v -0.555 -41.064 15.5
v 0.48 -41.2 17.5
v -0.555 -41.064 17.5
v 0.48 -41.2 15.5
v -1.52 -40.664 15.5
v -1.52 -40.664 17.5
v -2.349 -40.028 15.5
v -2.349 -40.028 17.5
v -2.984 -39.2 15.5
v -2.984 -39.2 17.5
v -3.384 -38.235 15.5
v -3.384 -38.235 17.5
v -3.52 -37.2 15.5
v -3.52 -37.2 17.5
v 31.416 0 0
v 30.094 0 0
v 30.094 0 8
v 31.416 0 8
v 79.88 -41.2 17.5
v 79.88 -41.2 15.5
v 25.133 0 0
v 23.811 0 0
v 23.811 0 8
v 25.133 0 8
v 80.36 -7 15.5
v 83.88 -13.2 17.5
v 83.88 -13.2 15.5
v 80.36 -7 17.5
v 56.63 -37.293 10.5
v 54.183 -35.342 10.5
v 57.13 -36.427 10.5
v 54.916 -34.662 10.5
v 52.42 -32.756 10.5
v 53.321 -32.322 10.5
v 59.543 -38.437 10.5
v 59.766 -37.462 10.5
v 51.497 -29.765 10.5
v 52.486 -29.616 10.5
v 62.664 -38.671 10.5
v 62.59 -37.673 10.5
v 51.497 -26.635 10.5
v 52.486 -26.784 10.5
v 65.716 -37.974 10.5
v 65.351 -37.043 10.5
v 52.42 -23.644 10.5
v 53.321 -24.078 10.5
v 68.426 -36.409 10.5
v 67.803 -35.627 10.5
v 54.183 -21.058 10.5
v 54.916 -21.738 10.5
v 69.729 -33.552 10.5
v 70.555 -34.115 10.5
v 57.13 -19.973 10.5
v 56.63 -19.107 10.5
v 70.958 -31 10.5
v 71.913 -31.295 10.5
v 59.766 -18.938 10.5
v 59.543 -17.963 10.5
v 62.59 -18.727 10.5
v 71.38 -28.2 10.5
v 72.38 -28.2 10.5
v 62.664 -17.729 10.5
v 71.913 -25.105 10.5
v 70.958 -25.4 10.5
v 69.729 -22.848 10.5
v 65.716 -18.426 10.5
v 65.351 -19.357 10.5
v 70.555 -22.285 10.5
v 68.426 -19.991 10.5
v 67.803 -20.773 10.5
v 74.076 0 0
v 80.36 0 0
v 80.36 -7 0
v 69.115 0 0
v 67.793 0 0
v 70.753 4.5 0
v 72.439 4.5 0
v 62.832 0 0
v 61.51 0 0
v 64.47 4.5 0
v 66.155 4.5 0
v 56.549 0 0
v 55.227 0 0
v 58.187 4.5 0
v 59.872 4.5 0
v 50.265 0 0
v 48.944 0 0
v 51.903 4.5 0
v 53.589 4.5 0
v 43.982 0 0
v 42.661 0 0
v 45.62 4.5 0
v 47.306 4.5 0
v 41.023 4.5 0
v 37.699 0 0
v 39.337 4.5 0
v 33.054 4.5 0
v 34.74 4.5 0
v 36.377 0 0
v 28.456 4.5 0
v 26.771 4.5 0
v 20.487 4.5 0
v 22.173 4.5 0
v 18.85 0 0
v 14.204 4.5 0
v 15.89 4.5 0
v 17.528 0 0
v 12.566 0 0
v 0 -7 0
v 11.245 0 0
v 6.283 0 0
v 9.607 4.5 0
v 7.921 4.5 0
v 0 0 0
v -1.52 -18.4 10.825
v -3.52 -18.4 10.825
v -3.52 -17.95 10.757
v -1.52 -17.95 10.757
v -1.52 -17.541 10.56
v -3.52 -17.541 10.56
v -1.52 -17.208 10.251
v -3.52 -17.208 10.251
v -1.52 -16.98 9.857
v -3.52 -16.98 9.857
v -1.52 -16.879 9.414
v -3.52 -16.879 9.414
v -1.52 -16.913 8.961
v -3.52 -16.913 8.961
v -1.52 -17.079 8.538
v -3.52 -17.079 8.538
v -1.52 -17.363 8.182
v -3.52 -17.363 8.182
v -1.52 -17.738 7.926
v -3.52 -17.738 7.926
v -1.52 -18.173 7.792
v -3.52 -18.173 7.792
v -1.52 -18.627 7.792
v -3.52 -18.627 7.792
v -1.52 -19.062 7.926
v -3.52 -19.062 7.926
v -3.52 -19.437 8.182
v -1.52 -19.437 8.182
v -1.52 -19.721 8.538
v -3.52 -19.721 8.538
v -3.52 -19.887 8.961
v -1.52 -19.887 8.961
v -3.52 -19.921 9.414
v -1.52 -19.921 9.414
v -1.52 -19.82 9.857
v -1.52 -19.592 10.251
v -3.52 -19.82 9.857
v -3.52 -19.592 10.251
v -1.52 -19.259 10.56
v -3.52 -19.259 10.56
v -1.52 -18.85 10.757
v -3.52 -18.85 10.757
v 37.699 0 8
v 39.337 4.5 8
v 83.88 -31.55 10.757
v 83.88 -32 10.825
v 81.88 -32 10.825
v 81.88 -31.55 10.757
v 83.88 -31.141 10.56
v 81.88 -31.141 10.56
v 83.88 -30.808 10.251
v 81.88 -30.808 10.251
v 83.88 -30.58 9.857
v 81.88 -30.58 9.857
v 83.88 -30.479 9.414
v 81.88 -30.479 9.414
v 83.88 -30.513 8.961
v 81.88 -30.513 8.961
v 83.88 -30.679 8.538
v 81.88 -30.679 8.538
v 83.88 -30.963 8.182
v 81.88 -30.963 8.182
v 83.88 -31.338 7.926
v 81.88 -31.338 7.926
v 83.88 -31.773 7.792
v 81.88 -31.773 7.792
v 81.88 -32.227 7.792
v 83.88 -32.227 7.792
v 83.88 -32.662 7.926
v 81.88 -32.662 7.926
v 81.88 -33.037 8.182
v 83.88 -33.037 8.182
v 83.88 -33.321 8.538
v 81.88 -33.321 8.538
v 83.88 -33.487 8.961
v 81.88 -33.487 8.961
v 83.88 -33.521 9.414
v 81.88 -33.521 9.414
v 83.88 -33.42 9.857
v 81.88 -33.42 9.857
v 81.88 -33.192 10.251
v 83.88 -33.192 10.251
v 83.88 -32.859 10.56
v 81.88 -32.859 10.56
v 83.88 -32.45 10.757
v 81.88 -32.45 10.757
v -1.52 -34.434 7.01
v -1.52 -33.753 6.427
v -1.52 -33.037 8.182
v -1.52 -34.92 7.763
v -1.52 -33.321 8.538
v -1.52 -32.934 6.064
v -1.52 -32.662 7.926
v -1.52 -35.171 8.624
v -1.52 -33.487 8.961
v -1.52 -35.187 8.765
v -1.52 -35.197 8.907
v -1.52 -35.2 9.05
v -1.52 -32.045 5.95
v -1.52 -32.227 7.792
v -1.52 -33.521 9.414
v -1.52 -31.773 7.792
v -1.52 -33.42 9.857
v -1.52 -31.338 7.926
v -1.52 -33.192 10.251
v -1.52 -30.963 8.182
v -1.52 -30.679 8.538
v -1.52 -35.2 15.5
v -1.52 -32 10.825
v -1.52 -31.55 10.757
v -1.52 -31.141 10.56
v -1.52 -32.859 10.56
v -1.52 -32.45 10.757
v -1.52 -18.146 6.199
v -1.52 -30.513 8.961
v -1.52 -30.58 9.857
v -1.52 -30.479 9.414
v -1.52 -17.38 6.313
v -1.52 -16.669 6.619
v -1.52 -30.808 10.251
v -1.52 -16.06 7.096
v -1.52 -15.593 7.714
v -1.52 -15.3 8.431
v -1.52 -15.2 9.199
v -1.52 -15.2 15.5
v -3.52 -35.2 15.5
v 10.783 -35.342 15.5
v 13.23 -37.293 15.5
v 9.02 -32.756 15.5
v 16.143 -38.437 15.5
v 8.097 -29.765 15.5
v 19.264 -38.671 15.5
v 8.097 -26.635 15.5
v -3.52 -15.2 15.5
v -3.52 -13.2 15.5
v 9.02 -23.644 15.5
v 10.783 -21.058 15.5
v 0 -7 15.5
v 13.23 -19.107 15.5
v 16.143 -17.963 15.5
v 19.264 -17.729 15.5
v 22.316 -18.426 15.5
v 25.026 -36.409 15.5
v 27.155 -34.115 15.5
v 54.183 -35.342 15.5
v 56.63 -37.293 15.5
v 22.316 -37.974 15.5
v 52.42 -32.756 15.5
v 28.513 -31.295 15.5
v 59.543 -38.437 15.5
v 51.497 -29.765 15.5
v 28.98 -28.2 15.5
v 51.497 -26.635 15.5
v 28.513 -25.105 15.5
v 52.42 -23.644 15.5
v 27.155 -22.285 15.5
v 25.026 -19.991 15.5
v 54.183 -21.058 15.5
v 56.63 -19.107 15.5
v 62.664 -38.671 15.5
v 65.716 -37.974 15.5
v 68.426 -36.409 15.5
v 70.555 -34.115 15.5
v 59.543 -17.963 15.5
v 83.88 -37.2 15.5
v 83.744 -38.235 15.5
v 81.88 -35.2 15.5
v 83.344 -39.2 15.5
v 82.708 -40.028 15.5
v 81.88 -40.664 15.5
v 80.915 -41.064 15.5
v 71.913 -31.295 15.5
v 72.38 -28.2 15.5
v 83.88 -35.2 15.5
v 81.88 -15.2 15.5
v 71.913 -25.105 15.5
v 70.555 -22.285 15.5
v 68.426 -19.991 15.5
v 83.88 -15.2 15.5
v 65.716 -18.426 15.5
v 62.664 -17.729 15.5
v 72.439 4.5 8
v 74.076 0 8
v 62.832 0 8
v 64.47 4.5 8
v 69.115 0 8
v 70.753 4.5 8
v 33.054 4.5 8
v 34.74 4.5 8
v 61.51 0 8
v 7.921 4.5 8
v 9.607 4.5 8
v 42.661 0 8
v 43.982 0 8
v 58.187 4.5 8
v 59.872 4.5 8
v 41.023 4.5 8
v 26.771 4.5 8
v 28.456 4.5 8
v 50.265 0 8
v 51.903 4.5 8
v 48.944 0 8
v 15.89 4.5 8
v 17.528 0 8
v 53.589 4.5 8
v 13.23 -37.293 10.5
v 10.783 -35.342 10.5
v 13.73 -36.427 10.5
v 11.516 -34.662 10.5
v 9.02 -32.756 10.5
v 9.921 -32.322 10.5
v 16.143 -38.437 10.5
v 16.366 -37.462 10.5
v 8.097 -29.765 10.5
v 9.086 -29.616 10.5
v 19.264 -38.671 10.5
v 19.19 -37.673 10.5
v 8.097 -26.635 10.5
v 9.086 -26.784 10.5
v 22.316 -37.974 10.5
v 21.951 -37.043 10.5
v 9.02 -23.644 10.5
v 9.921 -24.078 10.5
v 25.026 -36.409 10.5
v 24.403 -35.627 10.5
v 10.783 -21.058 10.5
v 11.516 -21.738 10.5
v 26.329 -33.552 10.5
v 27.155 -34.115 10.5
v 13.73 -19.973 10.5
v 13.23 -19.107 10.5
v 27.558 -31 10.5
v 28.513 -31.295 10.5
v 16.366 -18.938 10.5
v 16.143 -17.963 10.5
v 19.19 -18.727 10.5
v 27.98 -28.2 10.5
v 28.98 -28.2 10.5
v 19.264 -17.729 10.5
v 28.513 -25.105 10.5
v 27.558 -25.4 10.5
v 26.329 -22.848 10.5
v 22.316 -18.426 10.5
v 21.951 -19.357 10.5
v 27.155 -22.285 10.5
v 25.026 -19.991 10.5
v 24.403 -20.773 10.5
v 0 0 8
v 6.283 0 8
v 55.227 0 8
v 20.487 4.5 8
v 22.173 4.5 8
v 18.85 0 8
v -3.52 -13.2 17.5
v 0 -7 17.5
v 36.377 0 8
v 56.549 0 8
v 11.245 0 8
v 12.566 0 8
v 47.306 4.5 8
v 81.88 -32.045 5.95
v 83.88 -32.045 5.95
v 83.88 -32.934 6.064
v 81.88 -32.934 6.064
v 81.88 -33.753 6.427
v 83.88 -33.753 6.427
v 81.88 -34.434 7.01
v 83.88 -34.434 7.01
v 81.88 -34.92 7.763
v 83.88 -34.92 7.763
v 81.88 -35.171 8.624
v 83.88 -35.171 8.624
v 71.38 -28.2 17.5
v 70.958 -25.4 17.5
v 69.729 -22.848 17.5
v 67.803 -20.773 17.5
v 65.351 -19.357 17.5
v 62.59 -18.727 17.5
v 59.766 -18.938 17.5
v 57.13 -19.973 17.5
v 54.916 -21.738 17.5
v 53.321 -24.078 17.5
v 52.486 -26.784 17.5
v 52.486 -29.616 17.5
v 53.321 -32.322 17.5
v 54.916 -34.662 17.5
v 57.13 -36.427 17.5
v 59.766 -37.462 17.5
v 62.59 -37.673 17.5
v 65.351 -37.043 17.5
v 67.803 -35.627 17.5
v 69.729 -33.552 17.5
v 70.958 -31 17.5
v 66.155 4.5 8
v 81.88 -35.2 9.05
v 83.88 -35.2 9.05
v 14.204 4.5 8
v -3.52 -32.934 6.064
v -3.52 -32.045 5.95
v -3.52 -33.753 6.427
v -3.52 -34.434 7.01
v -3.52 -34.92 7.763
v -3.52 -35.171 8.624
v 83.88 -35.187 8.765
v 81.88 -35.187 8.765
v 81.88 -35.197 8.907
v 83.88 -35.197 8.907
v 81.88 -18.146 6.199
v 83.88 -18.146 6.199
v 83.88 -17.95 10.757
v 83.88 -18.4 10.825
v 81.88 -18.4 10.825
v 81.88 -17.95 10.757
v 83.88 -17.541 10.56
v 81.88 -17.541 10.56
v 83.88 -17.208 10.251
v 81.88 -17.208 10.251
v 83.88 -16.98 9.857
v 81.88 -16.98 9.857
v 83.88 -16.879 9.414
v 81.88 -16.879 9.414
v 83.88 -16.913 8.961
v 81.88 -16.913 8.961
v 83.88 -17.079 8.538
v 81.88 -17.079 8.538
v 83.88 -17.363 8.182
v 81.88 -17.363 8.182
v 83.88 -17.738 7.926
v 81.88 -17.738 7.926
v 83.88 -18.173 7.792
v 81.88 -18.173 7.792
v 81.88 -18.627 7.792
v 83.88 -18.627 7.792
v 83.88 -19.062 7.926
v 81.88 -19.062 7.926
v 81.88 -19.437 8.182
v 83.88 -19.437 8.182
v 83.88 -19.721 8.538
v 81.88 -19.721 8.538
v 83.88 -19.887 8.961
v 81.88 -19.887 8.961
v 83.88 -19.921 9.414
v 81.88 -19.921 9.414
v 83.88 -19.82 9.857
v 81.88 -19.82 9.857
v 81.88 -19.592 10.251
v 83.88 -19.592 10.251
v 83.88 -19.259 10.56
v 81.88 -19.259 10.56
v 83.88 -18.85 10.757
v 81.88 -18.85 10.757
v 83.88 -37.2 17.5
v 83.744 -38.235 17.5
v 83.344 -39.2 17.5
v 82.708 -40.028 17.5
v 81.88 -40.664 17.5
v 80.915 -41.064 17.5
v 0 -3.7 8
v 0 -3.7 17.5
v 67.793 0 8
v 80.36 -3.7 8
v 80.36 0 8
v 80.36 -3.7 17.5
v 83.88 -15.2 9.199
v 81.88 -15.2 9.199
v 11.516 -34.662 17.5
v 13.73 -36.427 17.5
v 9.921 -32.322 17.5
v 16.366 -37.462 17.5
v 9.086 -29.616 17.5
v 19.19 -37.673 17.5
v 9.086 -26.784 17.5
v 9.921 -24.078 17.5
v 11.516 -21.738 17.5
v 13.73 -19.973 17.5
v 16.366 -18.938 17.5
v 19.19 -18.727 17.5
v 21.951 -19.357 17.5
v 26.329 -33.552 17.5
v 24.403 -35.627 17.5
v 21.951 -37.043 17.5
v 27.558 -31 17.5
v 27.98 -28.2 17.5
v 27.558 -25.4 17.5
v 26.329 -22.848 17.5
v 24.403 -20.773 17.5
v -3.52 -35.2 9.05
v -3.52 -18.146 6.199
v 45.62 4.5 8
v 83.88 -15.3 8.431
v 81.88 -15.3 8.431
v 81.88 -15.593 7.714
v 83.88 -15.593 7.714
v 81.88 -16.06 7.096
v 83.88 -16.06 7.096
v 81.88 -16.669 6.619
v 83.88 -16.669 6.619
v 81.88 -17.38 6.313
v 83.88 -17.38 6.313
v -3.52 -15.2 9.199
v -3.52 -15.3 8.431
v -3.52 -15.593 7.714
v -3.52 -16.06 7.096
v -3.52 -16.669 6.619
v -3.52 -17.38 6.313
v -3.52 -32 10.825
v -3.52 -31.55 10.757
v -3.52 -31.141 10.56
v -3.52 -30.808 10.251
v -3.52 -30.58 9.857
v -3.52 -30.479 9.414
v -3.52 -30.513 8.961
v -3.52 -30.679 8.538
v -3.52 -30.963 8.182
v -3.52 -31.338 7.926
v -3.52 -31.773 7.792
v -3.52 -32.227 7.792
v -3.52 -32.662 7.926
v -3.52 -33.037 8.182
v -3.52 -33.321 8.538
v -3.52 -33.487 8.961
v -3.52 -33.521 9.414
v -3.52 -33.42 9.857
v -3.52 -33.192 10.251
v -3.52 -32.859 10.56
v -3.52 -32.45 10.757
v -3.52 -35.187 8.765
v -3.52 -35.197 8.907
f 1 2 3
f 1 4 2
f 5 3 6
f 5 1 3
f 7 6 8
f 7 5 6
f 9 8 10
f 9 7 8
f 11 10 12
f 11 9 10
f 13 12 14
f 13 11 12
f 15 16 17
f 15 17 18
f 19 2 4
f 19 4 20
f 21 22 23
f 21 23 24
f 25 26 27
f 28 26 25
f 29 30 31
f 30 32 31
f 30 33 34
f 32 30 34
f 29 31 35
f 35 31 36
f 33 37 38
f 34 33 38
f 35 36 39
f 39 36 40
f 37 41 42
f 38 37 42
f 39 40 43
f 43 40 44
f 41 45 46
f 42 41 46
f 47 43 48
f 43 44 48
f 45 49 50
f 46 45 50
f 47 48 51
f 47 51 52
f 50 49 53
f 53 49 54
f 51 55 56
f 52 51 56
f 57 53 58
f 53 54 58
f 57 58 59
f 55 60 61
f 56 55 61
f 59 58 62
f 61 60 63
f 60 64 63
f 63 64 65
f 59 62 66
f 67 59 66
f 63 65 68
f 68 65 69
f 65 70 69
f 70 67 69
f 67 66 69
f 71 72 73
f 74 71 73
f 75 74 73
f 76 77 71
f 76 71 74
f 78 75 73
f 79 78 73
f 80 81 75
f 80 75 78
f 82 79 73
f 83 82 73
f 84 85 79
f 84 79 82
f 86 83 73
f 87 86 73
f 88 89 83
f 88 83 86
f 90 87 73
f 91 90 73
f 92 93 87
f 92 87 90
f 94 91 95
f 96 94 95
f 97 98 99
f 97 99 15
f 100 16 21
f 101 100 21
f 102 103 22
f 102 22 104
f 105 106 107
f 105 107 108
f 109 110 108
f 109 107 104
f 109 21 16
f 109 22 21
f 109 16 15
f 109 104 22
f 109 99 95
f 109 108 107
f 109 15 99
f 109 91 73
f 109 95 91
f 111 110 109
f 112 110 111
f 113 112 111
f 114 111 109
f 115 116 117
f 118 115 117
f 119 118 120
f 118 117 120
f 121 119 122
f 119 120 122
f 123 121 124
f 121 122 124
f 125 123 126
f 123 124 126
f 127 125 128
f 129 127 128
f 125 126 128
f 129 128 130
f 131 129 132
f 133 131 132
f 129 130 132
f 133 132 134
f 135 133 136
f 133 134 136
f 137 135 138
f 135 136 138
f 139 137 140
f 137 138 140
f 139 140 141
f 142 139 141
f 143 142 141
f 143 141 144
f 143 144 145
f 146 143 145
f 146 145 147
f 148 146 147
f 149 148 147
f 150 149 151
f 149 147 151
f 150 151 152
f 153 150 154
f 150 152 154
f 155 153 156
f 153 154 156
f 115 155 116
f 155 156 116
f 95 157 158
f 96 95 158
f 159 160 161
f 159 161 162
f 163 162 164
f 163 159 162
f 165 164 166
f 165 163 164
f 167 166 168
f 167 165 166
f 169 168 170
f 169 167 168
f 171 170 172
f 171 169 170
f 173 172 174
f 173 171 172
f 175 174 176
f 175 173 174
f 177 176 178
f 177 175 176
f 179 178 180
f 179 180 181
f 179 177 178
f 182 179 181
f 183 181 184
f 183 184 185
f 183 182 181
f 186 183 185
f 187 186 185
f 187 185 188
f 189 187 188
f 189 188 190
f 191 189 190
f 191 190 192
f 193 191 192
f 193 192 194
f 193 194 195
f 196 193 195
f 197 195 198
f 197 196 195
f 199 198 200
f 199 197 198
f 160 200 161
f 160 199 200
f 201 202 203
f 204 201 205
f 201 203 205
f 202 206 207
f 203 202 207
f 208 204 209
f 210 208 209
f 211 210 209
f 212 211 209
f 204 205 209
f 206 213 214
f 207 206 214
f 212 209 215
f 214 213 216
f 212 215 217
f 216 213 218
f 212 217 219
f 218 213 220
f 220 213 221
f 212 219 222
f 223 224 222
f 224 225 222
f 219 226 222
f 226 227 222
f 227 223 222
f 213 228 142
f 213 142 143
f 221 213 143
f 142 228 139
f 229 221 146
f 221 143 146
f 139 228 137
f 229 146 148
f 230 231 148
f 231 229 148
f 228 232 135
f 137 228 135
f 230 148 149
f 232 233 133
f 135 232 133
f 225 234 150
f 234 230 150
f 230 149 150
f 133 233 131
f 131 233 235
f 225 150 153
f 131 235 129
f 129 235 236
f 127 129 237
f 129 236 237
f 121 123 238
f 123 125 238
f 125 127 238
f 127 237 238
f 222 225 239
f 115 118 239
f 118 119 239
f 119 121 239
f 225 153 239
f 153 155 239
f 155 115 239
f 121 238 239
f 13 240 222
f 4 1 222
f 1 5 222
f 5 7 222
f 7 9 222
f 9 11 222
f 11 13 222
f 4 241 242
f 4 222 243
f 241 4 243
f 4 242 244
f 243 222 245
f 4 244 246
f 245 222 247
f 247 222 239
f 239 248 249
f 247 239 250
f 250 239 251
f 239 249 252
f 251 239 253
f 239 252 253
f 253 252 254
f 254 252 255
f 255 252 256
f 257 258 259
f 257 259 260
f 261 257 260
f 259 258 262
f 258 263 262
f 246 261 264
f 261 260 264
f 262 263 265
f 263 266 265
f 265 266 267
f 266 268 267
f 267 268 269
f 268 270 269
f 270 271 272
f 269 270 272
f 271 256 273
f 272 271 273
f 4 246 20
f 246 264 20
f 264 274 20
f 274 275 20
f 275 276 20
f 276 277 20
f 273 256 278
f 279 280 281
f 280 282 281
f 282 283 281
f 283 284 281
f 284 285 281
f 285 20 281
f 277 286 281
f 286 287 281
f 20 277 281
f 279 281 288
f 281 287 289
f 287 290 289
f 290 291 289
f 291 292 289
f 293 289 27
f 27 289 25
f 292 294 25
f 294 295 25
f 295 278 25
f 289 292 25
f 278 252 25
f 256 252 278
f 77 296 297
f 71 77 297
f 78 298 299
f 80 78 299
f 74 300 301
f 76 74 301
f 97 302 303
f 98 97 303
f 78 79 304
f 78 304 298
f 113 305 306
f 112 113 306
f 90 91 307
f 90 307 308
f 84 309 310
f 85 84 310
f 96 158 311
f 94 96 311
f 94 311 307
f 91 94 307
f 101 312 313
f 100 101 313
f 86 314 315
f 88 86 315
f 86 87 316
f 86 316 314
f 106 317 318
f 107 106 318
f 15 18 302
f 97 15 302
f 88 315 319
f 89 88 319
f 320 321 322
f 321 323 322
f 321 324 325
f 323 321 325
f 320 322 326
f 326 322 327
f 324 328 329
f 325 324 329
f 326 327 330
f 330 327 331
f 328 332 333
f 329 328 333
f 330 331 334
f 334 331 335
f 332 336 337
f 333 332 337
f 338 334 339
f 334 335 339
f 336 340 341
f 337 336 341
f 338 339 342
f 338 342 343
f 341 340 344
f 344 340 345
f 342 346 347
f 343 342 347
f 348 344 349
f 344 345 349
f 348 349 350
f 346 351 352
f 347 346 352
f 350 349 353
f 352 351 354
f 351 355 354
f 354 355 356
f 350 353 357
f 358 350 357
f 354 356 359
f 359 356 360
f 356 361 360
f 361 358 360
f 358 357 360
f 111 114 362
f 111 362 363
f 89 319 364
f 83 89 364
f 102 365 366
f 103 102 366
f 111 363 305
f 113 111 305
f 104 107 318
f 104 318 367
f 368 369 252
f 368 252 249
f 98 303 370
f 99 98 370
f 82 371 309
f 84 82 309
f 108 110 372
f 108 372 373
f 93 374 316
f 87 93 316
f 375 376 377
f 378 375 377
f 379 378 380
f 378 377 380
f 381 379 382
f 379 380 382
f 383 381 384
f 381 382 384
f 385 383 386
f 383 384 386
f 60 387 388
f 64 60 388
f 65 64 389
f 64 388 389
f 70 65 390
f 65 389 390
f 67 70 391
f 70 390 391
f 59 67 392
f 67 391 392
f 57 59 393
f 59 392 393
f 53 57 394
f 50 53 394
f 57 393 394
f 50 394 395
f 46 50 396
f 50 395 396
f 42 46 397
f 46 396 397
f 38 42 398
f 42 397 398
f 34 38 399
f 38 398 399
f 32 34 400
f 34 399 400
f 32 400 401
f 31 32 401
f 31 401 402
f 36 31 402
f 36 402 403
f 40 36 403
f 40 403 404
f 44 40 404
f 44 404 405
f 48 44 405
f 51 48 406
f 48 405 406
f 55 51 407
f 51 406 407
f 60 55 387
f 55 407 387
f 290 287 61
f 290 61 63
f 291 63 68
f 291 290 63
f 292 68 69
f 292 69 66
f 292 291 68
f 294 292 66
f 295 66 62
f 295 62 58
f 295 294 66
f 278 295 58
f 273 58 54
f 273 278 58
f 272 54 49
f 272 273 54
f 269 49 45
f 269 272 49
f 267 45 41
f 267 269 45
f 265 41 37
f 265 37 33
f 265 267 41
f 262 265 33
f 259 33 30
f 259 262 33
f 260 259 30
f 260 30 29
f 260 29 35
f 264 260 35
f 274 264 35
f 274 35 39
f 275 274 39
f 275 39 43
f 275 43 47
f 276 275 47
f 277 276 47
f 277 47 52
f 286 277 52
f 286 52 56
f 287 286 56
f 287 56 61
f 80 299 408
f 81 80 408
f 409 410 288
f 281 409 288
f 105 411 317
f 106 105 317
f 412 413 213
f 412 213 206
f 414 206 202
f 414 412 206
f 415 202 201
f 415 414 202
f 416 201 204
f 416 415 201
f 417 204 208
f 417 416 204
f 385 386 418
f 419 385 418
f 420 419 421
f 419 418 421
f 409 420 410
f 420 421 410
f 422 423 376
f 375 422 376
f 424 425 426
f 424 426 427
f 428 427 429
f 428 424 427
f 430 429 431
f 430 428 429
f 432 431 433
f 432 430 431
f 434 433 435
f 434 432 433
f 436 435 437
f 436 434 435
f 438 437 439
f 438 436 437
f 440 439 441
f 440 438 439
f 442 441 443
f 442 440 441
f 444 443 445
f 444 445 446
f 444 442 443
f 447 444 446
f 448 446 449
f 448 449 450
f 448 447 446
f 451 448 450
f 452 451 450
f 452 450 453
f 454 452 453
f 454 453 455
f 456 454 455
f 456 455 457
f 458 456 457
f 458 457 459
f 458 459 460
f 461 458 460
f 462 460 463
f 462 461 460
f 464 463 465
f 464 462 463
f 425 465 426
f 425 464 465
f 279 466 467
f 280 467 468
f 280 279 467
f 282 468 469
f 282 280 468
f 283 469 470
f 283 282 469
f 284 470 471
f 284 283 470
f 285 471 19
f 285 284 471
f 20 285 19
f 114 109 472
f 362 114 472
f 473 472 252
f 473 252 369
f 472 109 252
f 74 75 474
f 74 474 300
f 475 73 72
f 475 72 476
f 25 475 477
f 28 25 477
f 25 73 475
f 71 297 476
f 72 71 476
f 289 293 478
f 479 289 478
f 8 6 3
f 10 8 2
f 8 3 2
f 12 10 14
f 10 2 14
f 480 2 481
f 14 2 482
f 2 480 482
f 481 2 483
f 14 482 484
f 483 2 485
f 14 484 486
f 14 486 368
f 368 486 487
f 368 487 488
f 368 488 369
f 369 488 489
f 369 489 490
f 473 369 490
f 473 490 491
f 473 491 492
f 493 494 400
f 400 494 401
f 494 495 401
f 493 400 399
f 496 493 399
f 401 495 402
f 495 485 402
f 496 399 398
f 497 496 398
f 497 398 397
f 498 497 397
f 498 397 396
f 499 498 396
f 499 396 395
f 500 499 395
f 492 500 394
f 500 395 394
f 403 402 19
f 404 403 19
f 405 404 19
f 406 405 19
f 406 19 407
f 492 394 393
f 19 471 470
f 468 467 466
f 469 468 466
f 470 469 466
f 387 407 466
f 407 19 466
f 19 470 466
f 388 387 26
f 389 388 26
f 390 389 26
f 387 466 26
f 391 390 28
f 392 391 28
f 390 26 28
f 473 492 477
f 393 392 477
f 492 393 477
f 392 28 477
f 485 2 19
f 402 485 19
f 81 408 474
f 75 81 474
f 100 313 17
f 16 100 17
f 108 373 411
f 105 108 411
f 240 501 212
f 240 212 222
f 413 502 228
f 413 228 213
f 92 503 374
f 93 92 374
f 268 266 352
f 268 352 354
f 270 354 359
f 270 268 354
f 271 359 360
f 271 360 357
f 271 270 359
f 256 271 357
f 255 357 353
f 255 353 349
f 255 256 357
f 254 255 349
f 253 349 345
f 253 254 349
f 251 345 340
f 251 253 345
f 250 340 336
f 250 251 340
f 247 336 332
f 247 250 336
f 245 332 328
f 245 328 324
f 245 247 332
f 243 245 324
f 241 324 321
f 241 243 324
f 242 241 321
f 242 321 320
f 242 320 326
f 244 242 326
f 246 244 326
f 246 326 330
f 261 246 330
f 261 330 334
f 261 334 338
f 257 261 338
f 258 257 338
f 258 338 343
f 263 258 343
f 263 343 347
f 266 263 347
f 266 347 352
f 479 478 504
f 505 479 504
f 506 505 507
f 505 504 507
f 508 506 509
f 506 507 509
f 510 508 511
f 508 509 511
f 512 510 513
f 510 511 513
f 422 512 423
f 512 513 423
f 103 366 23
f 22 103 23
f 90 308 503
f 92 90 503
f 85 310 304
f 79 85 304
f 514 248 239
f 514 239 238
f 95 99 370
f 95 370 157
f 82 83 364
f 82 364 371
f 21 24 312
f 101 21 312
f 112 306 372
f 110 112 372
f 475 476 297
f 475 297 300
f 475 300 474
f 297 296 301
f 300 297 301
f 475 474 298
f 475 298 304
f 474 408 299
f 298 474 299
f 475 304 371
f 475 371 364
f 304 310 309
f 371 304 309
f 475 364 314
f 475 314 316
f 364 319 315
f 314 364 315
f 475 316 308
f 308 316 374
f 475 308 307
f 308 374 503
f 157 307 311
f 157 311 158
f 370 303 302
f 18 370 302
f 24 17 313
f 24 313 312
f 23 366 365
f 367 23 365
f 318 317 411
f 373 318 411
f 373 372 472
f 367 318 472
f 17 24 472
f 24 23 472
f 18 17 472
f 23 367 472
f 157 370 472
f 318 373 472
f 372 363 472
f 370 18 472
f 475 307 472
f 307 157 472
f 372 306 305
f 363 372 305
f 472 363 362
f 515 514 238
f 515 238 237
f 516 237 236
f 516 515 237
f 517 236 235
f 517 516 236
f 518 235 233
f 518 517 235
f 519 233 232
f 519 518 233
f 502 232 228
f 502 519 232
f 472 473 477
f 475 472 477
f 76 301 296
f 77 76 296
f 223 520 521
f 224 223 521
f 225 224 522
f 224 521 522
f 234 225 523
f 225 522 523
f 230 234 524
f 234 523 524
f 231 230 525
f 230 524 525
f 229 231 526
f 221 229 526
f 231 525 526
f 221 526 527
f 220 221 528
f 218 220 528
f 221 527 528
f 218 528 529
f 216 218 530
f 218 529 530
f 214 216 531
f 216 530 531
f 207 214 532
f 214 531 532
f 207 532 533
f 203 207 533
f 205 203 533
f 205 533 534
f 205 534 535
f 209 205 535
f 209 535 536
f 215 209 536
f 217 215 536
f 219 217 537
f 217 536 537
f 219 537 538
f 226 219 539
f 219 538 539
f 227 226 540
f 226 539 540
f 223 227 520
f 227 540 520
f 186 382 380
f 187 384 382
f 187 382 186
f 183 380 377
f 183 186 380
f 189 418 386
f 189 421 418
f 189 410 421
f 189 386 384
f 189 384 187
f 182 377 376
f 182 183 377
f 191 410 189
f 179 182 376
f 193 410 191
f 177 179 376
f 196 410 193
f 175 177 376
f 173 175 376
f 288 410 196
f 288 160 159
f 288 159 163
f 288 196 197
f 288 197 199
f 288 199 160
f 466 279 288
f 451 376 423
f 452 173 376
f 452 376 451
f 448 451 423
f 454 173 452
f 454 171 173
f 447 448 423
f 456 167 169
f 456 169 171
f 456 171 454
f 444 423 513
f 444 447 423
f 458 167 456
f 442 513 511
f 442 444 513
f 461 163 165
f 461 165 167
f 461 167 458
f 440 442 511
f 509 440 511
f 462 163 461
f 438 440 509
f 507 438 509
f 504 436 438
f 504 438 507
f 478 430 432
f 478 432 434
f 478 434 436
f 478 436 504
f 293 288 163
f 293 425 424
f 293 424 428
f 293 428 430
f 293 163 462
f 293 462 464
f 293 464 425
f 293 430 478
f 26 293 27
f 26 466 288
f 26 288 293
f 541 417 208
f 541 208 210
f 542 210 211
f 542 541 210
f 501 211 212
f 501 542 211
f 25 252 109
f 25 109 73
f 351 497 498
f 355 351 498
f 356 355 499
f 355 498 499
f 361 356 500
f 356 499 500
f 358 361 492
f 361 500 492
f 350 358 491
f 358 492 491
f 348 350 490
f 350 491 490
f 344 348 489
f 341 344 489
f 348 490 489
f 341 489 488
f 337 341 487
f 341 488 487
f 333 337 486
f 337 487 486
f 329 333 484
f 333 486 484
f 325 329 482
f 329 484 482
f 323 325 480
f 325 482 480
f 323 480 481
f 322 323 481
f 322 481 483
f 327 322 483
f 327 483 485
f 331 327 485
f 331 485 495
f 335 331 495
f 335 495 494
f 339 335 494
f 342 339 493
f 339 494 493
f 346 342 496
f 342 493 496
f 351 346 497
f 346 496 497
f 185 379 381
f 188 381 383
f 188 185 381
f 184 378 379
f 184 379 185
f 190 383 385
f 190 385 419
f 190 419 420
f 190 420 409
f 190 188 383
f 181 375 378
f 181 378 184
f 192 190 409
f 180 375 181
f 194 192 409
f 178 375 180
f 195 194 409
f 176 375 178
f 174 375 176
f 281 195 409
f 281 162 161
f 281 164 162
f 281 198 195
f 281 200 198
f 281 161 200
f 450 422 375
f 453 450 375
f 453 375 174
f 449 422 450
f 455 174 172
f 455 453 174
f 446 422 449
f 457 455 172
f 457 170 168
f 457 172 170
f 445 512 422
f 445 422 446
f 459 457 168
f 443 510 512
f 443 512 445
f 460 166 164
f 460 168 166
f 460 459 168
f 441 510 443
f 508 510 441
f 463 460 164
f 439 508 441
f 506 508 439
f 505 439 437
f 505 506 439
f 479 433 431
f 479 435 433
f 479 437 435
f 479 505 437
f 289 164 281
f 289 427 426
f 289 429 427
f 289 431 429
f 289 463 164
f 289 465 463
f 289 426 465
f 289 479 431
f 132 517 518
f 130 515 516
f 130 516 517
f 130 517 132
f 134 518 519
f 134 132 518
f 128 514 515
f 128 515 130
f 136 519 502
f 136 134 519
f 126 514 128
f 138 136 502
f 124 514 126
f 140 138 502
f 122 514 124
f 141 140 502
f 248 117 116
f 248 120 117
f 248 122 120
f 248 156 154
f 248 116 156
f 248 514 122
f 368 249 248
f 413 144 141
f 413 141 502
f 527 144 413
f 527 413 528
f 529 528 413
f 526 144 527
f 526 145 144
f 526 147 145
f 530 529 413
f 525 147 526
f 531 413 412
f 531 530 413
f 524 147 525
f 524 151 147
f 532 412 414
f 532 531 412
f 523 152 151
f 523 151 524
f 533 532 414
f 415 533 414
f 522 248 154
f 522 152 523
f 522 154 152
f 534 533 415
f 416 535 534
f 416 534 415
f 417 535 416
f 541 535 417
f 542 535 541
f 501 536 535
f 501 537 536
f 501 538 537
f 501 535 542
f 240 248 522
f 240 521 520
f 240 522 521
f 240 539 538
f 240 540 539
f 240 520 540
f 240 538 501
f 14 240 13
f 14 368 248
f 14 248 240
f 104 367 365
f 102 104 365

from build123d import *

# Parameters (mm, degrees)
SKETCH1_W           = 213.628300444
SKETCH1_H           = 8
EXTRUDE1_DEPTH      = 8
EXTRUDE2_DEPTH      = 8
LPATTERN1_COUNT     = 34
LPATTERN1_PITCH     = 6.283185307
SKETCH_1_W          = 133.268632933
SKETCH_1_H          = 8
CUT_EXTRUDE_1_DEPTH = 25
SKETCH_2_W          = 4.961443825
SKETCH_2_H          = 8
CUT_EXTRUDE_2_DEPTH = 50
SKETCH_3_W          = 80.359667511
SKETCH_3_H          = 1
CUT_EXTRUDE_3_DEPTH = 50
SKETCH_4_W          = 80.359667511
SKETCH_4_H          = 9.5
EXTRUDE_1_DEPTH     = 3.3
SKETCH_5_R          = 10.5
SKETCH_5_R_2        = 9.5
EXTRUDE_2_DEPTH     = 7
EXTRUDE_2_2_DEPTH   = 7
SKETCH_6_R          = 10.5
EXTRUDE_3_DEPTH     = 2
EXTRUDE_4_DEPTH     = 2
SKETCH_8_R          = 1.525
CUT_EXTRUDE_4_DEPTH = 2
FILLET_1_R          = 4


with BuildPart() as part:
    # Sketch1 → Extrude1 (new body)
    with BuildSketch(Plane.XY):
        with Locations((106.814150222, -4)):
            Rectangle(SKETCH1_W, SKETCH1_H)
    extrude(amount=EXTRUDE1_DEPTH)

    # Sketch2 → Extrude2 (add)
    with BuildSketch(Plane.XY.offset(8)):
        Polygon((0, 0), (1.637866054, 4.5), (3.323577771, 4.5), (4.961443825, 0), align=None)
    extrude2 = extrude(amount=-EXTRUDE2_DEPTH)

    # LPattern1: Extrude2 ×34
    with Locations(*[(i * LPATTERN1_PITCH, 0, 0) for i in range(1, LPATTERN1_COUNT)]):
        add(extrude2)

    # 草图1 → 切除-拉伸1 (cut, symmetric)
    with BuildSketch(Plane(origin=(0, 0, 0), x_dir=(1, 0, 0), z_dir=(0, 1, 0))):
        with Locations((146.993983978, -4)):
            Rectangle(SKETCH_1_W, SKETCH_1_H)
    extrude(amount=CUT_EXTRUDE_1_DEPTH, both=True, mode=Mode.SUBTRACT)

    # 草图2 → 切除-拉伸2 (cut)
    with BuildSketch(Plane(origin=(0, 0, 0), x_dir=(1, 0, 0), z_dir=(0, 1, 0))):
        with Locations((77.878945599, -4)):
            Rectangle(SKETCH_2_W, SKETCH_2_H)
        with Locations((2.480721912, -4)):
            Rectangle(SKETCH_2_W, SKETCH_2_H)
    extrude(amount=CUT_EXTRUDE_2_DEPTH, mode=Mode.SUBTRACT)

    # 草图3 → 切除-拉伸3 (cut)
    with BuildSketch(Plane(origin=(0, 0, 0), x_dir=(-1, 0, 0), z_dir=(0, 0, -1))):
        with Locations((-40.179833756, -7.5)):
            Rectangle(SKETCH_3_W, SKETCH_3_H)
    extrude(amount=-CUT_EXTRUDE_3_DEPTH, mode=Mode.SUBTRACT)

    # 草图4 → 凸台-拉伸1 (add)
    with BuildSketch(Plane.XZ.offset(7)):
        with Locations((40.179833756, 12.75)):
            Rectangle(SKETCH_4_W, SKETCH_4_H)
    extrude(amount=-EXTRUDE_1_DEPTH)



with BuildPart() as body_2:
    # 草图5 → 凸台-拉伸2 (new body)
    with BuildSketch(Plane.XY.offset(17.5)):
        with Locations((61.879833756, -28.2)):
            Circle(SKETCH_5_R)
        with Locations((61.879833756, -28.2)):
            Circle(SKETCH_5_R_2, mode=Mode.SUBTRACT)
    extrude(amount=-EXTRUDE_2_DEPTH)


with BuildPart() as body_3:
    # 草图5 → Extrude 2 2 (new body)
    with BuildSketch(Plane.XY.offset(17.5)):
        with Locations((18.479833756, -28.2)):
            Circle(SKETCH_5_R)
        with Locations((18.479833756, -28.2)):
            Circle(SKETCH_5_R_2, mode=Mode.SUBTRACT)
    extrude(amount=-EXTRUDE_2_2_DEPTH)


with BuildPart() as part_1:
    add(part.part)

    add(body_2.part)  # 凸台-拉伸3 merges body 2

    add(body_3.part)  # 凸台-拉伸3 merges body 3
    # 草图6 → 凸台-拉伸3 (add)
    with BuildSketch(Plane.XY.offset(17.5)):
        Polygon((-3.520166244, -41.2), (83.879833756, -41.2), (83.879833756, -13.2), (80.359667511, -7), (0, -7), (-3.520166244, -13.2), align=None)
        with Locations((61.879833756, -28.2)):
            Circle(SKETCH_6_R, mode=Mode.SUBTRACT)
        with Locations((18.479833756, -28.2)):
            Circle(SKETCH_6_R, mode=Mode.SUBTRACT)
    extrude(amount=-EXTRUDE_3_DEPTH)

    # 草图7 → 凸台-拉伸4 (add)
    with BuildSketch(Plane.ZY.offset(3.520166244)):
        with BuildLine():
            Line((17.5, -15.2), (9.198571137, -15.2))
            ThreePointArc((9.198571137, -15.2), (7.09630212, -16.059797912), (6.199050778, -18.14635668))
            Line((6.199050778, -18.14635668), (5.950495627, -32.044568569))
            ThreePointArc((5.950495627, -32.044568569), (6.693951707, -34.11470505), (8.623569492, -35.170530414))
            ThreePointArc((8.623569492, -35.170530414), (8.836276209, -35.192623828), (9.05, -35.2))
            Line((9.05, -35.2), (17.5, -35.2))
            Line((17.5, -35.2), (17.5, -15.2))
        make_face()
    extrude_4 = extrude(amount=-EXTRUDE_4_DEPTH)

    # 镜向1: 凸台-拉伸4 across plane
    add(extrude_4.mirror(Plane.ZY.offset(-40.179833756)))

    # 草图8 → 切除-拉伸4 (cut)
    with BuildSketch(Plane.ZY.offset(3.520166244)):
        with Locations((9.3, -18.4)):
            Circle(SKETCH_8_R)
        with Locations((9.3, -32)):
            Circle(SKETCH_8_R)
    cut_extrude_4 = extrude(amount=-CUT_EXTRUDE_4_DEPTH, mode=Mode.SUBTRACT)

    # 镜向2: 切除-拉伸4 across plane
    add(cut_extrude_4.mirror(Plane.ZY.offset(-40.179833756)), mode=Mode.SUBTRACT)

    # 圆角1
    fillet_1_edges = [part_1.edges().sort_by_distance(p)[0] for p in [
        (83.879833756, -41.2, 16.5),
        (-3.520166244, -41.2, 16.5),
    ]]
    fillet(fillet_1_edges, radius=FILLET_1_R)


solid = part_1.part
